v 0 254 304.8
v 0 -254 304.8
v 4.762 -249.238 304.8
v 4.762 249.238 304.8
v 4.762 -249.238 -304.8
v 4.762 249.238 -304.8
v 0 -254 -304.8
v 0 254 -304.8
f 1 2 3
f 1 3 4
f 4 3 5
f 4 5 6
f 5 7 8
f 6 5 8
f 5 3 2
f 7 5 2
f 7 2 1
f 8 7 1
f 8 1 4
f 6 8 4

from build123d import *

# Parameters (mm, degrees)
F0_W     = 508
F0_H     = 609.6
F1_DEPTH = 4.7625
F3_DEPTH = 609.601
F5_DEPTH = 609.601


with BuildPart() as f1:
    # F0 (on Right) → F1 (new body)
    with BuildSketch(Plane.YZ):
        Rectangle(F0_W, F0_H)
    extrude(amount=F1_DEPTH)

    # F2 (on face) → F3 (cut, through all)
    with BuildSketch(Plane.XY.offset(304.8)):
        Polygon((0, -254), (4.7625, -254), (4.7625, -249.2375), align=None)
    extrude(amount=-F3_DEPTH, mode=Mode.SUBTRACT)

    # F4 (on face) → F5 (cut, through all)
    with BuildSketch(Plane.XY.offset(304.8)):
        Polygon((4.7625, 249.2375), (4.7625, 254), (0, 254), align=None)
    extrude(amount=-F5_DEPTH, mode=Mode.SUBTRACT)


solid = f1.part
